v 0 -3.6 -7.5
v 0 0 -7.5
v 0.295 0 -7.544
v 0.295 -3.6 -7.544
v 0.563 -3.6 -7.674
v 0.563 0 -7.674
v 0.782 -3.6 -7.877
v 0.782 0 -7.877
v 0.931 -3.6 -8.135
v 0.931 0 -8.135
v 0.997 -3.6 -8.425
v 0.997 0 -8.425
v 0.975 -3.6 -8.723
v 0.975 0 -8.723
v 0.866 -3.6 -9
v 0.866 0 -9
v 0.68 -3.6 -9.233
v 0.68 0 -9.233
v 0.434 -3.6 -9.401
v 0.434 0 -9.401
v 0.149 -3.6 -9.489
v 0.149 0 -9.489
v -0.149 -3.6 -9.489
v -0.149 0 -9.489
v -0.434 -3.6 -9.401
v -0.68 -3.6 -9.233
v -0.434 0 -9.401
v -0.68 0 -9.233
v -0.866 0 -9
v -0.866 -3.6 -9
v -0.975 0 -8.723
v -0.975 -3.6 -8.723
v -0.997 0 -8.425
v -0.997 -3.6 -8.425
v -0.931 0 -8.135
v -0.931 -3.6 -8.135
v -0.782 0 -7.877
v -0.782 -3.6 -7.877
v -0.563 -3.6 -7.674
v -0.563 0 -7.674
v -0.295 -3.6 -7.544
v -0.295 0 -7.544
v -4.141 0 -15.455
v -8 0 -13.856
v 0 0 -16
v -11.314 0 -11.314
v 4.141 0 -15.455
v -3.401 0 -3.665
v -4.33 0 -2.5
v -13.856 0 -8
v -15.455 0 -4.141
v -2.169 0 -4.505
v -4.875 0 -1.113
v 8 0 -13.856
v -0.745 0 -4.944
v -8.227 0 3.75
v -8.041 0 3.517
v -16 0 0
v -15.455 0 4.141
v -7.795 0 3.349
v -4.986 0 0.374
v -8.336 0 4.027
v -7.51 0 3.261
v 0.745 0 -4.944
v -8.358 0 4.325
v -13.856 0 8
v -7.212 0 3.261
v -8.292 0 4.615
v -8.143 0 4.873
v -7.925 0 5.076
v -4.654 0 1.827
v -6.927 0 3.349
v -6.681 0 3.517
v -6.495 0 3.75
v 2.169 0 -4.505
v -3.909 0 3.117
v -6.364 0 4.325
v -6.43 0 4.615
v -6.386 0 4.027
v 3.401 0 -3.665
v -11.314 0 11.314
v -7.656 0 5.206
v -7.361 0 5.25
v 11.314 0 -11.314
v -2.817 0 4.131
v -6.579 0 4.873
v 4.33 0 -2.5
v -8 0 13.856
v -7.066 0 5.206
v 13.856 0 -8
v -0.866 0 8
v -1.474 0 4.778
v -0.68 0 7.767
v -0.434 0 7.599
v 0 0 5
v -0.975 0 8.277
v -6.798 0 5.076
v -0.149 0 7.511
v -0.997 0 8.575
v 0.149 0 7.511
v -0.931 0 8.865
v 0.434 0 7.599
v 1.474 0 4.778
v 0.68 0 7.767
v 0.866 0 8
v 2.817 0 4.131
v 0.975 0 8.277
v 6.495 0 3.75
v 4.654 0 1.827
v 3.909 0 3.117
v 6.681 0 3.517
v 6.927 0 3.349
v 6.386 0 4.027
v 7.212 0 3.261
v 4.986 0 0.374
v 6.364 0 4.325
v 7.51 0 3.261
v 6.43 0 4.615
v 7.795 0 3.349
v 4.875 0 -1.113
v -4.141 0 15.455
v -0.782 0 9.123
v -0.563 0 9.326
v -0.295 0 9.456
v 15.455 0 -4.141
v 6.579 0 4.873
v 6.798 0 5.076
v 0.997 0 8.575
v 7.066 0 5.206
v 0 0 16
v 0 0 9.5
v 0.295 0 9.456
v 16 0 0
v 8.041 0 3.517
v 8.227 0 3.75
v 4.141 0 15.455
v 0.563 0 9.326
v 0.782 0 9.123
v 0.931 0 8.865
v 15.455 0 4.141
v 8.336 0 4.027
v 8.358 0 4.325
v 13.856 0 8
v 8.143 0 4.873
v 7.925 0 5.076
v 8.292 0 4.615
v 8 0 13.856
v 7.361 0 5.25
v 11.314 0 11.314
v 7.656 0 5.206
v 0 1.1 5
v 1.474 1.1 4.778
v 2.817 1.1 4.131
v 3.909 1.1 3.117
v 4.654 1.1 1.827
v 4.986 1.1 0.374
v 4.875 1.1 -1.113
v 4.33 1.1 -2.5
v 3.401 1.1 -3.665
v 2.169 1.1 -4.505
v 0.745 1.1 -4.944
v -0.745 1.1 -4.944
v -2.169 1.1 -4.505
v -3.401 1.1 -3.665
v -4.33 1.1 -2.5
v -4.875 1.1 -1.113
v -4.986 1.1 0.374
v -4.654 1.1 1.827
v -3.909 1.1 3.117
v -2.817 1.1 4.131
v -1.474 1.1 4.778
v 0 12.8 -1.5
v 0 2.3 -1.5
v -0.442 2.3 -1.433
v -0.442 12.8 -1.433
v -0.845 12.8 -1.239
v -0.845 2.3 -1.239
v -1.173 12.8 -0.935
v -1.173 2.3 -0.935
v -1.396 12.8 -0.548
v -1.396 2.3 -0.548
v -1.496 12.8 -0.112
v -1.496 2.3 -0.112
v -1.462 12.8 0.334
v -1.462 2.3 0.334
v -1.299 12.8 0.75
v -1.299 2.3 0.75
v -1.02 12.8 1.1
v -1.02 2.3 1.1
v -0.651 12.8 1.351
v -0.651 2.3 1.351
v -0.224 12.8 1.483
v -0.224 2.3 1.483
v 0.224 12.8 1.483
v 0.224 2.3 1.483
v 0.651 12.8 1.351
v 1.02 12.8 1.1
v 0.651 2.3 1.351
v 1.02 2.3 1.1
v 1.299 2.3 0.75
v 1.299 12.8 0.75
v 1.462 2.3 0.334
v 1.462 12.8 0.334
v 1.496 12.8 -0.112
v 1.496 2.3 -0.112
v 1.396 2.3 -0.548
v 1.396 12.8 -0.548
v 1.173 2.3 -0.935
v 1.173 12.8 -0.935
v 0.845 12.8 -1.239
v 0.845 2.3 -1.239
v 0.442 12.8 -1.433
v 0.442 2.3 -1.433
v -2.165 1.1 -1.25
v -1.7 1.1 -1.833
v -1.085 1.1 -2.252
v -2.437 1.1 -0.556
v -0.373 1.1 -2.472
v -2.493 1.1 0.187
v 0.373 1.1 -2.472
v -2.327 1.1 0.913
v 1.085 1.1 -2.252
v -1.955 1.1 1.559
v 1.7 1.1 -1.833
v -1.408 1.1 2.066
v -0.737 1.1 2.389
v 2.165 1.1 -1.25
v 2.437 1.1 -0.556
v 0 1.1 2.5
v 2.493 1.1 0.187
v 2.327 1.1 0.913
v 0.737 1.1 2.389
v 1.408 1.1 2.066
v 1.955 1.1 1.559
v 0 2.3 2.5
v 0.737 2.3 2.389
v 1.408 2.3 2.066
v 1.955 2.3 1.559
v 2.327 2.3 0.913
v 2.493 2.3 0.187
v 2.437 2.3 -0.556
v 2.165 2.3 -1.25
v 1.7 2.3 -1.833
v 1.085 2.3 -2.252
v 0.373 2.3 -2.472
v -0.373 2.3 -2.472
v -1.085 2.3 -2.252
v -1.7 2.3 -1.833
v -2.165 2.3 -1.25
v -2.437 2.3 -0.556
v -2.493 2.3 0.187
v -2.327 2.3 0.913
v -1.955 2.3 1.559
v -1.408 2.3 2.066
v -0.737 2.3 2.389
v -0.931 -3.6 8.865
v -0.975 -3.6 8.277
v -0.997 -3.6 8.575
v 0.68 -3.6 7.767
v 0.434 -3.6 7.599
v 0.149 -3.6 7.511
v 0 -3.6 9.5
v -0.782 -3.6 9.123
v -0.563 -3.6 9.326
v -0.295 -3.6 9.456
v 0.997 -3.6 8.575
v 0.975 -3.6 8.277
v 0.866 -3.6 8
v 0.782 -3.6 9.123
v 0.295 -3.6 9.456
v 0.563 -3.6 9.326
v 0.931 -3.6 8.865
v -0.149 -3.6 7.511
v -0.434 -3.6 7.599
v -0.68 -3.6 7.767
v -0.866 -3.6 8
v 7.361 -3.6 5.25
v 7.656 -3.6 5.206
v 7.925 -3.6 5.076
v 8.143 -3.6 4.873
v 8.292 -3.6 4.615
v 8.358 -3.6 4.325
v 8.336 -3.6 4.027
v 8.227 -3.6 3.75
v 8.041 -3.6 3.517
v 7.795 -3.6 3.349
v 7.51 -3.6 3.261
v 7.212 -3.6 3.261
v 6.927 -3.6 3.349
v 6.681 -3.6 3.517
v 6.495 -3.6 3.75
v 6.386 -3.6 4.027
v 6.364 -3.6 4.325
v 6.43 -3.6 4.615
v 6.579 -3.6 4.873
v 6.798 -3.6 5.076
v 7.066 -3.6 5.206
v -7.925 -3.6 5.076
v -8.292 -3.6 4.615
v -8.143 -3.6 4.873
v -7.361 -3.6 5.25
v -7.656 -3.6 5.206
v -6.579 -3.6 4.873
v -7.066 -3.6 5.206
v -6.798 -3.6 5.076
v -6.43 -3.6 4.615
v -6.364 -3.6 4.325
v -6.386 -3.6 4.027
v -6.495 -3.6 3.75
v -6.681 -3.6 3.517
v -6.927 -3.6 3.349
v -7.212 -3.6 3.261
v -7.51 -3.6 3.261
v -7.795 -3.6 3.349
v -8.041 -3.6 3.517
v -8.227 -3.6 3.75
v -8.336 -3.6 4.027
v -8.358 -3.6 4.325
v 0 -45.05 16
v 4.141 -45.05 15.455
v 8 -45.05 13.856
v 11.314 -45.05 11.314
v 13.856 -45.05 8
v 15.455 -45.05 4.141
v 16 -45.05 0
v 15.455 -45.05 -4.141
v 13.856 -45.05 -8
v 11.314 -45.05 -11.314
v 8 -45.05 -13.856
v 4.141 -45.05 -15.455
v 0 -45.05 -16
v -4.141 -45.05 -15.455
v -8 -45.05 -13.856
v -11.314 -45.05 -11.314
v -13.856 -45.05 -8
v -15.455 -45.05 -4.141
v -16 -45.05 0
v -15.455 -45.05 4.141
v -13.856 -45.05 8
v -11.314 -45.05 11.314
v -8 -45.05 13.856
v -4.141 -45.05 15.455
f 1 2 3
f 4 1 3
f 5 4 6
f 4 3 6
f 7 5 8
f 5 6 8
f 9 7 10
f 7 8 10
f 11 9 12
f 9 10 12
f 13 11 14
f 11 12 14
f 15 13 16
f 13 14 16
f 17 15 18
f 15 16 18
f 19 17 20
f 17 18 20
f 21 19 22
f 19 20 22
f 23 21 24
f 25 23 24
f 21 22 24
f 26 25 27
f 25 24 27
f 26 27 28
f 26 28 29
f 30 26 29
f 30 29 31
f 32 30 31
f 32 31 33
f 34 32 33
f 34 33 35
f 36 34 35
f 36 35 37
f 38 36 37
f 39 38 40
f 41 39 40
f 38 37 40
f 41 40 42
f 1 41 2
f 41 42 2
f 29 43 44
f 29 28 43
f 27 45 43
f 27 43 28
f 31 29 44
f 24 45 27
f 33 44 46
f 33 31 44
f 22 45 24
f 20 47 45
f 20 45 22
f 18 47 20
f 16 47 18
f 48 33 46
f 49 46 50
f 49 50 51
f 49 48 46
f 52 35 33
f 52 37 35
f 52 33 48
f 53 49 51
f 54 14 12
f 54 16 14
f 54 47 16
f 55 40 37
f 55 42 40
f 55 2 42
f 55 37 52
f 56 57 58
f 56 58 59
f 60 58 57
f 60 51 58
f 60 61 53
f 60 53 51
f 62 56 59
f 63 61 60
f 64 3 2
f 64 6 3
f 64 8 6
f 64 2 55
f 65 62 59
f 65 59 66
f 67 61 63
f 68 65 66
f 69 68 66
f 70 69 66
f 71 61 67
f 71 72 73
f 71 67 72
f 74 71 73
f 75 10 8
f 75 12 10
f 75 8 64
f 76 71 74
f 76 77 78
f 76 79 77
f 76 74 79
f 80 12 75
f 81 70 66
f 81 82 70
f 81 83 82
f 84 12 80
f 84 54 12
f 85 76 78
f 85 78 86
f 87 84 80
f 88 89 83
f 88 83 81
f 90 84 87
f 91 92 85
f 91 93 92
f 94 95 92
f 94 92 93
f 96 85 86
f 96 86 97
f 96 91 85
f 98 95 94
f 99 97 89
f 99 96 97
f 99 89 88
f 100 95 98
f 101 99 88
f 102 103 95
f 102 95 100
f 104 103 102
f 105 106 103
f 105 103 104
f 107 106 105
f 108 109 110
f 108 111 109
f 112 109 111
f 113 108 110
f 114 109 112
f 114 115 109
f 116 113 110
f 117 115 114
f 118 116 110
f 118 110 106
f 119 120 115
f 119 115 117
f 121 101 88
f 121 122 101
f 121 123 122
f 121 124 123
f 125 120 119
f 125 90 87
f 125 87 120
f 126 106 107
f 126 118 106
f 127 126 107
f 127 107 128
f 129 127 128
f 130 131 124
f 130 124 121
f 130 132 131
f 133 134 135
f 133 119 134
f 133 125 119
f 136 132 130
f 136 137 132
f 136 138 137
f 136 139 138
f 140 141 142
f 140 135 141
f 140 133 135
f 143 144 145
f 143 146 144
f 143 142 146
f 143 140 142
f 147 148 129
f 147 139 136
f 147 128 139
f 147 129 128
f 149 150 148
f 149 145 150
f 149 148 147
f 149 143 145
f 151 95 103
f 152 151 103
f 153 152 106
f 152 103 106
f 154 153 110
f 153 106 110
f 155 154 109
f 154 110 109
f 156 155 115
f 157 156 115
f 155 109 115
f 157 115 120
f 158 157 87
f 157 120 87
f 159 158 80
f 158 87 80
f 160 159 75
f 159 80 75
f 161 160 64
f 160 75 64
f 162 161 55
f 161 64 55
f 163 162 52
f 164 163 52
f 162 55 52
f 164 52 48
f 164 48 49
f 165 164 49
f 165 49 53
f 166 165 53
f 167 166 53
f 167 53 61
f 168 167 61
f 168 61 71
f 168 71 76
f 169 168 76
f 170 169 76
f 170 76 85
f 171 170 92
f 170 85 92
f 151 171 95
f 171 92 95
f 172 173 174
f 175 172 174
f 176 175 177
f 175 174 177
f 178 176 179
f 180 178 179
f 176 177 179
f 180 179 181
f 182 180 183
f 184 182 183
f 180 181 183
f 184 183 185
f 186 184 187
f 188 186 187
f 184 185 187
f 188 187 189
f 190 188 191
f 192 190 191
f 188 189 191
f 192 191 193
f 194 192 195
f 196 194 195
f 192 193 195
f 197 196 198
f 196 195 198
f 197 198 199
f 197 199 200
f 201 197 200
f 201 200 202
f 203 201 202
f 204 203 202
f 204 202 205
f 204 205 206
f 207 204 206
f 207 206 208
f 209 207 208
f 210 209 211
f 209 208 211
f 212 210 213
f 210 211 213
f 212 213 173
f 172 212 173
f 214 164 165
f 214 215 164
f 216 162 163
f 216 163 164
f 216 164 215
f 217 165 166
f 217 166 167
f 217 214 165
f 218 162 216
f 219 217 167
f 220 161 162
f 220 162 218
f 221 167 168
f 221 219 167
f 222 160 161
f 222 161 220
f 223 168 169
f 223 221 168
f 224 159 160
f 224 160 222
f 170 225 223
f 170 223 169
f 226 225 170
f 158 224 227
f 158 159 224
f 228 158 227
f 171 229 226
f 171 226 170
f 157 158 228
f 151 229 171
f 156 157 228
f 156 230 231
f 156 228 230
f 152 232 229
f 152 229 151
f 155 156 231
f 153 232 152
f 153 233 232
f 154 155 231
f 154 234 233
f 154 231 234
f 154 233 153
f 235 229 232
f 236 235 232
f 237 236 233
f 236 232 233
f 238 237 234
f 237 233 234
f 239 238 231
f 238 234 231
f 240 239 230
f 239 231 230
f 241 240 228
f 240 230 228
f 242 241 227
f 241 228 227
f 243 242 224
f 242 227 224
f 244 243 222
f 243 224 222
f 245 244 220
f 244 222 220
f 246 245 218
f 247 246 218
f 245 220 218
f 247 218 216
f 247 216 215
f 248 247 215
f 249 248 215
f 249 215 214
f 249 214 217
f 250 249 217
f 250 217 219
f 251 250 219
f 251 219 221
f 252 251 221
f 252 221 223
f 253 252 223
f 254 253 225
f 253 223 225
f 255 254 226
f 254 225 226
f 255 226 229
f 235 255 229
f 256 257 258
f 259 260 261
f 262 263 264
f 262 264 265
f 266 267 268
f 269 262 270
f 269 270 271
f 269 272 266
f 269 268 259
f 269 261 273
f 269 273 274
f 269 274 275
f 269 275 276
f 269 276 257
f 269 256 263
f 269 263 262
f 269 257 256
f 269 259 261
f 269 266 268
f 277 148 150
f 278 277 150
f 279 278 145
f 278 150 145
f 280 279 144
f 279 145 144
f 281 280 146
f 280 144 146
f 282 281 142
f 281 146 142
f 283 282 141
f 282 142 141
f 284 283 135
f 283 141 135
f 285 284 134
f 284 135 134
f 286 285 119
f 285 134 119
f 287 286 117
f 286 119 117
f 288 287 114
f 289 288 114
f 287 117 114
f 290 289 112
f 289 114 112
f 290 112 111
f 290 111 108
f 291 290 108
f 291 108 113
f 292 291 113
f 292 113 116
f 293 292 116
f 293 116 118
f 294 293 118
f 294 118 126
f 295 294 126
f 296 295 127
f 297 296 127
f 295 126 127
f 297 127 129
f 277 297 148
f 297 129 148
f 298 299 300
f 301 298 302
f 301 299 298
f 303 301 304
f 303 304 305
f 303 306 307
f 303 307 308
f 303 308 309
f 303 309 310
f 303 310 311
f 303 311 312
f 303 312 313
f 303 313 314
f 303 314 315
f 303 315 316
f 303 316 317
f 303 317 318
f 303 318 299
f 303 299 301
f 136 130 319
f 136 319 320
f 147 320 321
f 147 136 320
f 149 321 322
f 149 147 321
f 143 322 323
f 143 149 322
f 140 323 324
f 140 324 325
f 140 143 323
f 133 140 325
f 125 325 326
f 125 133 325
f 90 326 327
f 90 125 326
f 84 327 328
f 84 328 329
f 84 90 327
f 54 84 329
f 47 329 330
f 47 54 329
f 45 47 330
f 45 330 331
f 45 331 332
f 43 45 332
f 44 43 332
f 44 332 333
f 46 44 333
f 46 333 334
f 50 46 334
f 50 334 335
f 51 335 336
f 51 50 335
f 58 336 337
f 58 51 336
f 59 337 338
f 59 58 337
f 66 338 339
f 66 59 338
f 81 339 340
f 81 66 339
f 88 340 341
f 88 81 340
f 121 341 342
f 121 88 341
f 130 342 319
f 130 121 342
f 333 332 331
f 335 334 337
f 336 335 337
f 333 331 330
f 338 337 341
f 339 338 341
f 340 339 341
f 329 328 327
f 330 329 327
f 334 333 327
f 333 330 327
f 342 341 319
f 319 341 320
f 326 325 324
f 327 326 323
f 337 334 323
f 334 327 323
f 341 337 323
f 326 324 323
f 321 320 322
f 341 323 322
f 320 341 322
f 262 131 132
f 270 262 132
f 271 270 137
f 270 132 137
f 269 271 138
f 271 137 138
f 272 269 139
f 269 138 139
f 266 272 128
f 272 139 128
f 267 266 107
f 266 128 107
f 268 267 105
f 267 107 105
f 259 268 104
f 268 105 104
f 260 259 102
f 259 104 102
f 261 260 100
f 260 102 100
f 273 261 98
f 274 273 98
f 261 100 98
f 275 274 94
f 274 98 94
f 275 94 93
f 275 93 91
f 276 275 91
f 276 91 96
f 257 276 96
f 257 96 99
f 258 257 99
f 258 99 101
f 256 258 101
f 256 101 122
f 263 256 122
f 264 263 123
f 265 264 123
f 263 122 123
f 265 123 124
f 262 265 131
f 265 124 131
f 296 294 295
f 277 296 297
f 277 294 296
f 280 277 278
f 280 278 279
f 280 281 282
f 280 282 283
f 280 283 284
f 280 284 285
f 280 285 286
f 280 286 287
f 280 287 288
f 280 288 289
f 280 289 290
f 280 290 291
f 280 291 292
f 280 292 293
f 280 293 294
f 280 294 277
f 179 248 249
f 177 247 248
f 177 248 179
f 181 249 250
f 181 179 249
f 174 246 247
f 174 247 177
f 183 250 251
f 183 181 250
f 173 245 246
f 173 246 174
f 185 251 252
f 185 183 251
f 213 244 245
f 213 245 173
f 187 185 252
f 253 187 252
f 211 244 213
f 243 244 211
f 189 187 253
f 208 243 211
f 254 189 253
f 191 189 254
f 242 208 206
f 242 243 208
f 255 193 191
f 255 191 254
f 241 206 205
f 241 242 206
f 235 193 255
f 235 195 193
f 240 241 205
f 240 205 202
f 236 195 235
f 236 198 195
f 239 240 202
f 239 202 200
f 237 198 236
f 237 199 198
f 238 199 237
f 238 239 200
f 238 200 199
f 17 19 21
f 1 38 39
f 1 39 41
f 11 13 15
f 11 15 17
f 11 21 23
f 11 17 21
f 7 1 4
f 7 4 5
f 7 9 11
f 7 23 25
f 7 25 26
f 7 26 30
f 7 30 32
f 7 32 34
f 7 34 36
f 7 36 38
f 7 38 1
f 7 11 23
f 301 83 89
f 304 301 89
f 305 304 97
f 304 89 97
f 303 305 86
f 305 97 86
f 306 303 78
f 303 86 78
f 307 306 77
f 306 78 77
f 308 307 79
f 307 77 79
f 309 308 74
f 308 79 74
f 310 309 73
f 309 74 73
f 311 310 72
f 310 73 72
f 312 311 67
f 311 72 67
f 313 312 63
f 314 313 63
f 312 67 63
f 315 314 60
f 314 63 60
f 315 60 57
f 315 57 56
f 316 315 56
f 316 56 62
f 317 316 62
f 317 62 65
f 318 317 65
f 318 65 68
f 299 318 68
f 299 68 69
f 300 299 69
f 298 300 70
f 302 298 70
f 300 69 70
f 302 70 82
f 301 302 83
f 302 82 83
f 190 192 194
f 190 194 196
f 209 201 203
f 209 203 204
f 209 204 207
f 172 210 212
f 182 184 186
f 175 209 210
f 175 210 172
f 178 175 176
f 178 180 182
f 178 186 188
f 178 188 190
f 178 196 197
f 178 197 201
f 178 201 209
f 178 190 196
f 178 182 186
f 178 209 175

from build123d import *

# Parameters (mm, degrees)
SKETCH1_R           = 16
BOSS_EXTRUDE1_DEPTH = 45.05
SKETCH3_R           = 5
BOSS_EXTRUDE2_DEPTH = 1.1
SKETCH4_R           = 2.5
BOSS_EXTRUDE3_DEPTH = 1.2
SKETCH5_R           = 1.5
BOSS_EXTRUDE4_DEPTH = 10.5
SKETCH6_R           = 1
CUT_EXTRUDE1_DEPTH  = 3.6


with BuildPart() as part:
    # Sketch1 → Boss-Extrude1 (new body)
    with BuildSketch(Plane(origin=(0, 0, 0), x_dir=(1, 0, 0), z_dir=(0, 1, 0))):
        with Locations(Location((0, 0, 0), (0, 0, 270))):
            Circle(SKETCH1_R)
    extrude(amount=-BOSS_EXTRUDE1_DEPTH)

    # Sketch3 → Boss-Extrude2 (add)
    with BuildSketch(Plane(origin=(0, 0, 0), x_dir=(1, 0, 0), z_dir=(0, 1, 0))):
        with Locations(Location((0, 0, 0), (0, 0, 270))):
            Circle(SKETCH3_R)
    extrude(amount=BOSS_EXTRUDE2_DEPTH)

    # Sketch4 → Boss-Extrude3 (add)
    with BuildSketch(Plane(origin=(0, 1.1, 0), x_dir=(1, 0, 0), z_dir=(0, 1, 0))):
        with Locations(Location((0, 0, 0), (0, 0, 270))):
            Circle(SKETCH4_R)
    extrude(amount=BOSS_EXTRUDE3_DEPTH)

    # Sketch5 → Boss-Extrude4 (add)
    with BuildSketch(Plane(origin=(0, 2.3, 0), x_dir=(1, 0, 0), z_dir=(0, 1, 0))):
        with Locations(Location((0, 0, 0), (0, 0, 90))):
            Circle(SKETCH5_R)
    extrude(amount=BOSS_EXTRUDE4_DEPTH)

    # Sketch6 → Cut-Extrude1 (cut)
    with BuildSketch(Plane(origin=(0, 0, 0), x_dir=(1, 0, 0), z_dir=(0, 1, 0))):
        with Locations(Location((0, 8.5, 0), (0, 0, 270))):
            Circle(SKETCH6_R)
        with Locations(Location((0, -8.5, 0), (0, 0, 270))):
            Circle(SKETCH6_R)
        with Locations(Location((-7.361215932, -4.25, 0), (0, 0, 270))):
            Circle(SKETCH6_R)
        with Locations(Location((7.361215932, -4.25, 0), (0, 0, 270))):
            Circle(SKETCH6_R)
    extrude(amount=-CUT_EXTRUDE1_DEPTH, mode=Mode.SUBTRACT)


solid = part.part
